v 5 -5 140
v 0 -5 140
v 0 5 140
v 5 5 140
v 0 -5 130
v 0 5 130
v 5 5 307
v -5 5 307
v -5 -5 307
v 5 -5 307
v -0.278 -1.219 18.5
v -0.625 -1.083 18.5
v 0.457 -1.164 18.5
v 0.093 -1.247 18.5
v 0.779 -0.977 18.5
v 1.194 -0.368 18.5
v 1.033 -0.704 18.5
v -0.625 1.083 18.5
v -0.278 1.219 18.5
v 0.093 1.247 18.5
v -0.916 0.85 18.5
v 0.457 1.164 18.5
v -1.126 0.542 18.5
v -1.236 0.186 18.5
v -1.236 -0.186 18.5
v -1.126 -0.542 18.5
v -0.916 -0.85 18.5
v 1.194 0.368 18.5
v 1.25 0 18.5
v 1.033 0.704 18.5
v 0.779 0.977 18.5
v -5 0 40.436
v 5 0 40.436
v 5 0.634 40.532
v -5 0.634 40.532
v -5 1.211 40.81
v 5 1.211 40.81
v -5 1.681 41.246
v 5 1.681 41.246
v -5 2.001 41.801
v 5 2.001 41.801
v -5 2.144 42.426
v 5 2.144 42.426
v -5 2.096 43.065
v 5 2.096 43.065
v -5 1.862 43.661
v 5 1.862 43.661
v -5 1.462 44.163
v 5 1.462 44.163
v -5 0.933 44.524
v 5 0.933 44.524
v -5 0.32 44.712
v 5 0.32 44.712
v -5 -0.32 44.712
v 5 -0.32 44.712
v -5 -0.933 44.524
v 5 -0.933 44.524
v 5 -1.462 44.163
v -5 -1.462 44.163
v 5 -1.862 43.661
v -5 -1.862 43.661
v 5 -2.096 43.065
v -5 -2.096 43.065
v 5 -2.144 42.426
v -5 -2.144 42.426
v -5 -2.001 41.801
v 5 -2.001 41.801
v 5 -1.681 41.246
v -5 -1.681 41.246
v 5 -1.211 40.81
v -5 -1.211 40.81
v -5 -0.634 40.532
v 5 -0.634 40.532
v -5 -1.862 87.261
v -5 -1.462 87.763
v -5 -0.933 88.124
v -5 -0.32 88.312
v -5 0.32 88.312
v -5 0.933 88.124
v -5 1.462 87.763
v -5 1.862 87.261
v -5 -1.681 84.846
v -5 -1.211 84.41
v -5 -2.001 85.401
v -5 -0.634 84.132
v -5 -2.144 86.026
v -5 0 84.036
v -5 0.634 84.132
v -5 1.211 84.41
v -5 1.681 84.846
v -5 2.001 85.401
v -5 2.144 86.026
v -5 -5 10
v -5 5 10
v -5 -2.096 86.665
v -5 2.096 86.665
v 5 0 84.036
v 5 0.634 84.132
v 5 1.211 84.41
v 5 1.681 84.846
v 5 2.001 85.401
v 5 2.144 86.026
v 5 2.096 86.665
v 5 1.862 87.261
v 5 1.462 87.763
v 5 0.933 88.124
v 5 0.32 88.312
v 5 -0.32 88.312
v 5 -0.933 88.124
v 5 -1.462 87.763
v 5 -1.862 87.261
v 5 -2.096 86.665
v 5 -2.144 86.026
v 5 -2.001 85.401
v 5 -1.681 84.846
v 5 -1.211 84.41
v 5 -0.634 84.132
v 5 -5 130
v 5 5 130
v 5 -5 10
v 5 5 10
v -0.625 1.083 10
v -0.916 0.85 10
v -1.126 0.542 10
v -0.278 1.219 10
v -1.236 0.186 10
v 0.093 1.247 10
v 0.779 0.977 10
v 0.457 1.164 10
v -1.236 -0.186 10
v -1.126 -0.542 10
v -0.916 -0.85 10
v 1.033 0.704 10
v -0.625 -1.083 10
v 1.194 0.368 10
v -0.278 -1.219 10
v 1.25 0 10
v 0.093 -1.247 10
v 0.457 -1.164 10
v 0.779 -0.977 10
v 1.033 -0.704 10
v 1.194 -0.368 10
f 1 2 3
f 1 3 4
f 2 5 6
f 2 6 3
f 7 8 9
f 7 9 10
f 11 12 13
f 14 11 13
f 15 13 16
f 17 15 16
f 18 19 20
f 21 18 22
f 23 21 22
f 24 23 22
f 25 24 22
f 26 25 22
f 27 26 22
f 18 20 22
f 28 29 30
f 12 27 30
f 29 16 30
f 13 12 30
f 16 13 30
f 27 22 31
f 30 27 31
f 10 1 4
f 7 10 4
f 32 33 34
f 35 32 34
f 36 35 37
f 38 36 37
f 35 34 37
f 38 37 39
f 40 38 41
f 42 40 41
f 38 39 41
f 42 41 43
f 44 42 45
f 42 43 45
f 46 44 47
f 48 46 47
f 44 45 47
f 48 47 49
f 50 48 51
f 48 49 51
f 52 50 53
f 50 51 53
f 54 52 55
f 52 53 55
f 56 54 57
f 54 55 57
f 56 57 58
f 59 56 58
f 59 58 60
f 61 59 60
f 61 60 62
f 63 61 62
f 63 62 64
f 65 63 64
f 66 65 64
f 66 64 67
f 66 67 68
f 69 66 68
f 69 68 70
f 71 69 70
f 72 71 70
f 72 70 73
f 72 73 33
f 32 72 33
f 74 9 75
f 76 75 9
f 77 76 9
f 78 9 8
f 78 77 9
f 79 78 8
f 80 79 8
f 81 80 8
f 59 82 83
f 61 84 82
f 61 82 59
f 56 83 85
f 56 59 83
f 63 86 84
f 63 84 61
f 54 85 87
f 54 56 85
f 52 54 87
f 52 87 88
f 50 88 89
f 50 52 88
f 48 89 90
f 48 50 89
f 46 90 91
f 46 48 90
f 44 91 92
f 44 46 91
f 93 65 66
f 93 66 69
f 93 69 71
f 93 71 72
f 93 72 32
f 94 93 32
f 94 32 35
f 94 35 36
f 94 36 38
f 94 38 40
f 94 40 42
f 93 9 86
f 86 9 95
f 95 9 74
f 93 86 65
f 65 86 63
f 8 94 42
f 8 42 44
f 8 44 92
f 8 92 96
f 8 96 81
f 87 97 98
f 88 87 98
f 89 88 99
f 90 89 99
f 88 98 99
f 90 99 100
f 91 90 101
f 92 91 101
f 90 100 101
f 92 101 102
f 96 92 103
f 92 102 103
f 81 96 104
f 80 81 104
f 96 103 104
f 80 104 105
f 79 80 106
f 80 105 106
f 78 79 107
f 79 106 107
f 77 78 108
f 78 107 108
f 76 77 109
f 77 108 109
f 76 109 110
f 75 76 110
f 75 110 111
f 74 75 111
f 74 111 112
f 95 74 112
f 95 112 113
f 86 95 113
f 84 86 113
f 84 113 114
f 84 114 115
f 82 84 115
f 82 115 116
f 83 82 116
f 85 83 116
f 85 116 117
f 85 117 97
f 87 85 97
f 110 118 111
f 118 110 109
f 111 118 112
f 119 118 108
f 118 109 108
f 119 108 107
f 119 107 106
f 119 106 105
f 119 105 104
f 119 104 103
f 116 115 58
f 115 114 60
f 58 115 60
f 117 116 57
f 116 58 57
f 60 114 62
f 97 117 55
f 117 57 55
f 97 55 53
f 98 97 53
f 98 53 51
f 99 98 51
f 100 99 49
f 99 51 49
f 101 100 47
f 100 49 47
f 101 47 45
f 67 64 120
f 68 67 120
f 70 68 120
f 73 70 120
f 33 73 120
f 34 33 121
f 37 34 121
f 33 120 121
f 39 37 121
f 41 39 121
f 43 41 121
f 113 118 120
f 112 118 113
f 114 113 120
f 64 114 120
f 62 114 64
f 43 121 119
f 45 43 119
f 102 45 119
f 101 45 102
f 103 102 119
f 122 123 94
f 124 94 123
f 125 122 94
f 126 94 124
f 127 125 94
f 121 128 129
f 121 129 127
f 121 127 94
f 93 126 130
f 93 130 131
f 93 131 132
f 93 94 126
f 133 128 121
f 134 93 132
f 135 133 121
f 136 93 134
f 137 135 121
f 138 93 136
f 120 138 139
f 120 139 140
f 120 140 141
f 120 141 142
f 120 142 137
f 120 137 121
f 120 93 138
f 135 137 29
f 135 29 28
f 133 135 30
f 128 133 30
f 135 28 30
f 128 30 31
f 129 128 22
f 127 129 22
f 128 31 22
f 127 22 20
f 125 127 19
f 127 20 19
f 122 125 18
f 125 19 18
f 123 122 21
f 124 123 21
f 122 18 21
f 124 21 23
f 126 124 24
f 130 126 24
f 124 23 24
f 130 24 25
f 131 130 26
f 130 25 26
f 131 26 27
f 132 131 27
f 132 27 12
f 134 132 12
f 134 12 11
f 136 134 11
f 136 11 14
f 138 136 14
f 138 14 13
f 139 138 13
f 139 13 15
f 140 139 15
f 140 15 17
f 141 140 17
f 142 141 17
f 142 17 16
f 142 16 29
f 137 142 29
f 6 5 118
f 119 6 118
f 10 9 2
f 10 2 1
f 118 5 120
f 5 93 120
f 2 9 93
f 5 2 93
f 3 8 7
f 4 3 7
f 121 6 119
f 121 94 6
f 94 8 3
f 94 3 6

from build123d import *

# Parameters (mm, degrees)
ESQUISSE1_W                  = 10
ESQUISSE1_H                  = 10
BOSS_EXTRU_1_DEPTH           = 307
ENL_V_MAT_EXTRU_1_DEPTH      = 308.081422427
ENL_V_MAT_EXTRU_1_DEPTH_BACK = 308.081422427
ESQUISSE2_W                  = 10
ESQUISSE2_H                  = 10
ESQUISSE3_W                  = 5
ESQUISSE3_H                  = 10
ENL_V_MAT_EXTRU_2_DEPTH      = 308.203515605
D_GAGEMENT_M41_D             = 4.3
TROU_TARAUD_M3X0_51_D        = 2.5
TROU_TARAUD_M3X0_51_DEPTH    = 8.5


with BuildPart() as part:
    # Esquisse1 → Boss.-Extru.1 (new body)
    with BuildSketch(Plane.XY):
        Rectangle(ESQUISSE1_W, ESQUISSE1_H)
    extrude(amount=BOSS_EXTRU_1_DEPTH)

    # Esquisse2 → Enlèv. mat.-Extru.1 (cut, two sides: drawn at the far end of the back side and taken through both)
    with BuildSketch(Plane(origin=(0, 0, 0), x_dir=(1, 0, 0), z_dir=(0, 1, 0)).offset(-ENL_V_MAT_EXTRU_1_DEPTH_BACK)):
        with Locations((0, -5)):
            Rectangle(ESQUISSE2_W, ESQUISSE2_H)
    extrude(amount=ENL_V_MAT_EXTRU_1_DEPTH + ENL_V_MAT_EXTRU_1_DEPTH_BACK, mode=Mode.SUBTRACT)

    # Esquisse3 → Enlèv. mat.-Extru.2 (cut, through all)
    with BuildSketch(Plane.XZ.offset(5)):
        with Locations((2.5, 135)):
            Rectangle(ESQUISSE3_W, ESQUISSE3_H)
    extrude(amount=-ENL_V_MAT_EXTRU_2_DEPTH, mode=Mode.SUBTRACT)

    # Dégagement M41 (through all)
    with Locations(Plane.ZY.offset(5)):
        with Locations((86.186482928, 0), (42.586482928, 0)):
            Hole(D_GAGEMENT_M41_D / 2)

    # Trou taraudé M3x0.51
    with Locations(Plane(origin=(0, 0, 10), x_dir=(-1, 0, 0), z_dir=(0, 0, -1))):
        with Locations((0, 0)):
            Hole(TROU_TARAUD_M3X0_51_D / 2, depth=TROU_TARAUD_M3X0_51_DEPTH)


solid = part.part
